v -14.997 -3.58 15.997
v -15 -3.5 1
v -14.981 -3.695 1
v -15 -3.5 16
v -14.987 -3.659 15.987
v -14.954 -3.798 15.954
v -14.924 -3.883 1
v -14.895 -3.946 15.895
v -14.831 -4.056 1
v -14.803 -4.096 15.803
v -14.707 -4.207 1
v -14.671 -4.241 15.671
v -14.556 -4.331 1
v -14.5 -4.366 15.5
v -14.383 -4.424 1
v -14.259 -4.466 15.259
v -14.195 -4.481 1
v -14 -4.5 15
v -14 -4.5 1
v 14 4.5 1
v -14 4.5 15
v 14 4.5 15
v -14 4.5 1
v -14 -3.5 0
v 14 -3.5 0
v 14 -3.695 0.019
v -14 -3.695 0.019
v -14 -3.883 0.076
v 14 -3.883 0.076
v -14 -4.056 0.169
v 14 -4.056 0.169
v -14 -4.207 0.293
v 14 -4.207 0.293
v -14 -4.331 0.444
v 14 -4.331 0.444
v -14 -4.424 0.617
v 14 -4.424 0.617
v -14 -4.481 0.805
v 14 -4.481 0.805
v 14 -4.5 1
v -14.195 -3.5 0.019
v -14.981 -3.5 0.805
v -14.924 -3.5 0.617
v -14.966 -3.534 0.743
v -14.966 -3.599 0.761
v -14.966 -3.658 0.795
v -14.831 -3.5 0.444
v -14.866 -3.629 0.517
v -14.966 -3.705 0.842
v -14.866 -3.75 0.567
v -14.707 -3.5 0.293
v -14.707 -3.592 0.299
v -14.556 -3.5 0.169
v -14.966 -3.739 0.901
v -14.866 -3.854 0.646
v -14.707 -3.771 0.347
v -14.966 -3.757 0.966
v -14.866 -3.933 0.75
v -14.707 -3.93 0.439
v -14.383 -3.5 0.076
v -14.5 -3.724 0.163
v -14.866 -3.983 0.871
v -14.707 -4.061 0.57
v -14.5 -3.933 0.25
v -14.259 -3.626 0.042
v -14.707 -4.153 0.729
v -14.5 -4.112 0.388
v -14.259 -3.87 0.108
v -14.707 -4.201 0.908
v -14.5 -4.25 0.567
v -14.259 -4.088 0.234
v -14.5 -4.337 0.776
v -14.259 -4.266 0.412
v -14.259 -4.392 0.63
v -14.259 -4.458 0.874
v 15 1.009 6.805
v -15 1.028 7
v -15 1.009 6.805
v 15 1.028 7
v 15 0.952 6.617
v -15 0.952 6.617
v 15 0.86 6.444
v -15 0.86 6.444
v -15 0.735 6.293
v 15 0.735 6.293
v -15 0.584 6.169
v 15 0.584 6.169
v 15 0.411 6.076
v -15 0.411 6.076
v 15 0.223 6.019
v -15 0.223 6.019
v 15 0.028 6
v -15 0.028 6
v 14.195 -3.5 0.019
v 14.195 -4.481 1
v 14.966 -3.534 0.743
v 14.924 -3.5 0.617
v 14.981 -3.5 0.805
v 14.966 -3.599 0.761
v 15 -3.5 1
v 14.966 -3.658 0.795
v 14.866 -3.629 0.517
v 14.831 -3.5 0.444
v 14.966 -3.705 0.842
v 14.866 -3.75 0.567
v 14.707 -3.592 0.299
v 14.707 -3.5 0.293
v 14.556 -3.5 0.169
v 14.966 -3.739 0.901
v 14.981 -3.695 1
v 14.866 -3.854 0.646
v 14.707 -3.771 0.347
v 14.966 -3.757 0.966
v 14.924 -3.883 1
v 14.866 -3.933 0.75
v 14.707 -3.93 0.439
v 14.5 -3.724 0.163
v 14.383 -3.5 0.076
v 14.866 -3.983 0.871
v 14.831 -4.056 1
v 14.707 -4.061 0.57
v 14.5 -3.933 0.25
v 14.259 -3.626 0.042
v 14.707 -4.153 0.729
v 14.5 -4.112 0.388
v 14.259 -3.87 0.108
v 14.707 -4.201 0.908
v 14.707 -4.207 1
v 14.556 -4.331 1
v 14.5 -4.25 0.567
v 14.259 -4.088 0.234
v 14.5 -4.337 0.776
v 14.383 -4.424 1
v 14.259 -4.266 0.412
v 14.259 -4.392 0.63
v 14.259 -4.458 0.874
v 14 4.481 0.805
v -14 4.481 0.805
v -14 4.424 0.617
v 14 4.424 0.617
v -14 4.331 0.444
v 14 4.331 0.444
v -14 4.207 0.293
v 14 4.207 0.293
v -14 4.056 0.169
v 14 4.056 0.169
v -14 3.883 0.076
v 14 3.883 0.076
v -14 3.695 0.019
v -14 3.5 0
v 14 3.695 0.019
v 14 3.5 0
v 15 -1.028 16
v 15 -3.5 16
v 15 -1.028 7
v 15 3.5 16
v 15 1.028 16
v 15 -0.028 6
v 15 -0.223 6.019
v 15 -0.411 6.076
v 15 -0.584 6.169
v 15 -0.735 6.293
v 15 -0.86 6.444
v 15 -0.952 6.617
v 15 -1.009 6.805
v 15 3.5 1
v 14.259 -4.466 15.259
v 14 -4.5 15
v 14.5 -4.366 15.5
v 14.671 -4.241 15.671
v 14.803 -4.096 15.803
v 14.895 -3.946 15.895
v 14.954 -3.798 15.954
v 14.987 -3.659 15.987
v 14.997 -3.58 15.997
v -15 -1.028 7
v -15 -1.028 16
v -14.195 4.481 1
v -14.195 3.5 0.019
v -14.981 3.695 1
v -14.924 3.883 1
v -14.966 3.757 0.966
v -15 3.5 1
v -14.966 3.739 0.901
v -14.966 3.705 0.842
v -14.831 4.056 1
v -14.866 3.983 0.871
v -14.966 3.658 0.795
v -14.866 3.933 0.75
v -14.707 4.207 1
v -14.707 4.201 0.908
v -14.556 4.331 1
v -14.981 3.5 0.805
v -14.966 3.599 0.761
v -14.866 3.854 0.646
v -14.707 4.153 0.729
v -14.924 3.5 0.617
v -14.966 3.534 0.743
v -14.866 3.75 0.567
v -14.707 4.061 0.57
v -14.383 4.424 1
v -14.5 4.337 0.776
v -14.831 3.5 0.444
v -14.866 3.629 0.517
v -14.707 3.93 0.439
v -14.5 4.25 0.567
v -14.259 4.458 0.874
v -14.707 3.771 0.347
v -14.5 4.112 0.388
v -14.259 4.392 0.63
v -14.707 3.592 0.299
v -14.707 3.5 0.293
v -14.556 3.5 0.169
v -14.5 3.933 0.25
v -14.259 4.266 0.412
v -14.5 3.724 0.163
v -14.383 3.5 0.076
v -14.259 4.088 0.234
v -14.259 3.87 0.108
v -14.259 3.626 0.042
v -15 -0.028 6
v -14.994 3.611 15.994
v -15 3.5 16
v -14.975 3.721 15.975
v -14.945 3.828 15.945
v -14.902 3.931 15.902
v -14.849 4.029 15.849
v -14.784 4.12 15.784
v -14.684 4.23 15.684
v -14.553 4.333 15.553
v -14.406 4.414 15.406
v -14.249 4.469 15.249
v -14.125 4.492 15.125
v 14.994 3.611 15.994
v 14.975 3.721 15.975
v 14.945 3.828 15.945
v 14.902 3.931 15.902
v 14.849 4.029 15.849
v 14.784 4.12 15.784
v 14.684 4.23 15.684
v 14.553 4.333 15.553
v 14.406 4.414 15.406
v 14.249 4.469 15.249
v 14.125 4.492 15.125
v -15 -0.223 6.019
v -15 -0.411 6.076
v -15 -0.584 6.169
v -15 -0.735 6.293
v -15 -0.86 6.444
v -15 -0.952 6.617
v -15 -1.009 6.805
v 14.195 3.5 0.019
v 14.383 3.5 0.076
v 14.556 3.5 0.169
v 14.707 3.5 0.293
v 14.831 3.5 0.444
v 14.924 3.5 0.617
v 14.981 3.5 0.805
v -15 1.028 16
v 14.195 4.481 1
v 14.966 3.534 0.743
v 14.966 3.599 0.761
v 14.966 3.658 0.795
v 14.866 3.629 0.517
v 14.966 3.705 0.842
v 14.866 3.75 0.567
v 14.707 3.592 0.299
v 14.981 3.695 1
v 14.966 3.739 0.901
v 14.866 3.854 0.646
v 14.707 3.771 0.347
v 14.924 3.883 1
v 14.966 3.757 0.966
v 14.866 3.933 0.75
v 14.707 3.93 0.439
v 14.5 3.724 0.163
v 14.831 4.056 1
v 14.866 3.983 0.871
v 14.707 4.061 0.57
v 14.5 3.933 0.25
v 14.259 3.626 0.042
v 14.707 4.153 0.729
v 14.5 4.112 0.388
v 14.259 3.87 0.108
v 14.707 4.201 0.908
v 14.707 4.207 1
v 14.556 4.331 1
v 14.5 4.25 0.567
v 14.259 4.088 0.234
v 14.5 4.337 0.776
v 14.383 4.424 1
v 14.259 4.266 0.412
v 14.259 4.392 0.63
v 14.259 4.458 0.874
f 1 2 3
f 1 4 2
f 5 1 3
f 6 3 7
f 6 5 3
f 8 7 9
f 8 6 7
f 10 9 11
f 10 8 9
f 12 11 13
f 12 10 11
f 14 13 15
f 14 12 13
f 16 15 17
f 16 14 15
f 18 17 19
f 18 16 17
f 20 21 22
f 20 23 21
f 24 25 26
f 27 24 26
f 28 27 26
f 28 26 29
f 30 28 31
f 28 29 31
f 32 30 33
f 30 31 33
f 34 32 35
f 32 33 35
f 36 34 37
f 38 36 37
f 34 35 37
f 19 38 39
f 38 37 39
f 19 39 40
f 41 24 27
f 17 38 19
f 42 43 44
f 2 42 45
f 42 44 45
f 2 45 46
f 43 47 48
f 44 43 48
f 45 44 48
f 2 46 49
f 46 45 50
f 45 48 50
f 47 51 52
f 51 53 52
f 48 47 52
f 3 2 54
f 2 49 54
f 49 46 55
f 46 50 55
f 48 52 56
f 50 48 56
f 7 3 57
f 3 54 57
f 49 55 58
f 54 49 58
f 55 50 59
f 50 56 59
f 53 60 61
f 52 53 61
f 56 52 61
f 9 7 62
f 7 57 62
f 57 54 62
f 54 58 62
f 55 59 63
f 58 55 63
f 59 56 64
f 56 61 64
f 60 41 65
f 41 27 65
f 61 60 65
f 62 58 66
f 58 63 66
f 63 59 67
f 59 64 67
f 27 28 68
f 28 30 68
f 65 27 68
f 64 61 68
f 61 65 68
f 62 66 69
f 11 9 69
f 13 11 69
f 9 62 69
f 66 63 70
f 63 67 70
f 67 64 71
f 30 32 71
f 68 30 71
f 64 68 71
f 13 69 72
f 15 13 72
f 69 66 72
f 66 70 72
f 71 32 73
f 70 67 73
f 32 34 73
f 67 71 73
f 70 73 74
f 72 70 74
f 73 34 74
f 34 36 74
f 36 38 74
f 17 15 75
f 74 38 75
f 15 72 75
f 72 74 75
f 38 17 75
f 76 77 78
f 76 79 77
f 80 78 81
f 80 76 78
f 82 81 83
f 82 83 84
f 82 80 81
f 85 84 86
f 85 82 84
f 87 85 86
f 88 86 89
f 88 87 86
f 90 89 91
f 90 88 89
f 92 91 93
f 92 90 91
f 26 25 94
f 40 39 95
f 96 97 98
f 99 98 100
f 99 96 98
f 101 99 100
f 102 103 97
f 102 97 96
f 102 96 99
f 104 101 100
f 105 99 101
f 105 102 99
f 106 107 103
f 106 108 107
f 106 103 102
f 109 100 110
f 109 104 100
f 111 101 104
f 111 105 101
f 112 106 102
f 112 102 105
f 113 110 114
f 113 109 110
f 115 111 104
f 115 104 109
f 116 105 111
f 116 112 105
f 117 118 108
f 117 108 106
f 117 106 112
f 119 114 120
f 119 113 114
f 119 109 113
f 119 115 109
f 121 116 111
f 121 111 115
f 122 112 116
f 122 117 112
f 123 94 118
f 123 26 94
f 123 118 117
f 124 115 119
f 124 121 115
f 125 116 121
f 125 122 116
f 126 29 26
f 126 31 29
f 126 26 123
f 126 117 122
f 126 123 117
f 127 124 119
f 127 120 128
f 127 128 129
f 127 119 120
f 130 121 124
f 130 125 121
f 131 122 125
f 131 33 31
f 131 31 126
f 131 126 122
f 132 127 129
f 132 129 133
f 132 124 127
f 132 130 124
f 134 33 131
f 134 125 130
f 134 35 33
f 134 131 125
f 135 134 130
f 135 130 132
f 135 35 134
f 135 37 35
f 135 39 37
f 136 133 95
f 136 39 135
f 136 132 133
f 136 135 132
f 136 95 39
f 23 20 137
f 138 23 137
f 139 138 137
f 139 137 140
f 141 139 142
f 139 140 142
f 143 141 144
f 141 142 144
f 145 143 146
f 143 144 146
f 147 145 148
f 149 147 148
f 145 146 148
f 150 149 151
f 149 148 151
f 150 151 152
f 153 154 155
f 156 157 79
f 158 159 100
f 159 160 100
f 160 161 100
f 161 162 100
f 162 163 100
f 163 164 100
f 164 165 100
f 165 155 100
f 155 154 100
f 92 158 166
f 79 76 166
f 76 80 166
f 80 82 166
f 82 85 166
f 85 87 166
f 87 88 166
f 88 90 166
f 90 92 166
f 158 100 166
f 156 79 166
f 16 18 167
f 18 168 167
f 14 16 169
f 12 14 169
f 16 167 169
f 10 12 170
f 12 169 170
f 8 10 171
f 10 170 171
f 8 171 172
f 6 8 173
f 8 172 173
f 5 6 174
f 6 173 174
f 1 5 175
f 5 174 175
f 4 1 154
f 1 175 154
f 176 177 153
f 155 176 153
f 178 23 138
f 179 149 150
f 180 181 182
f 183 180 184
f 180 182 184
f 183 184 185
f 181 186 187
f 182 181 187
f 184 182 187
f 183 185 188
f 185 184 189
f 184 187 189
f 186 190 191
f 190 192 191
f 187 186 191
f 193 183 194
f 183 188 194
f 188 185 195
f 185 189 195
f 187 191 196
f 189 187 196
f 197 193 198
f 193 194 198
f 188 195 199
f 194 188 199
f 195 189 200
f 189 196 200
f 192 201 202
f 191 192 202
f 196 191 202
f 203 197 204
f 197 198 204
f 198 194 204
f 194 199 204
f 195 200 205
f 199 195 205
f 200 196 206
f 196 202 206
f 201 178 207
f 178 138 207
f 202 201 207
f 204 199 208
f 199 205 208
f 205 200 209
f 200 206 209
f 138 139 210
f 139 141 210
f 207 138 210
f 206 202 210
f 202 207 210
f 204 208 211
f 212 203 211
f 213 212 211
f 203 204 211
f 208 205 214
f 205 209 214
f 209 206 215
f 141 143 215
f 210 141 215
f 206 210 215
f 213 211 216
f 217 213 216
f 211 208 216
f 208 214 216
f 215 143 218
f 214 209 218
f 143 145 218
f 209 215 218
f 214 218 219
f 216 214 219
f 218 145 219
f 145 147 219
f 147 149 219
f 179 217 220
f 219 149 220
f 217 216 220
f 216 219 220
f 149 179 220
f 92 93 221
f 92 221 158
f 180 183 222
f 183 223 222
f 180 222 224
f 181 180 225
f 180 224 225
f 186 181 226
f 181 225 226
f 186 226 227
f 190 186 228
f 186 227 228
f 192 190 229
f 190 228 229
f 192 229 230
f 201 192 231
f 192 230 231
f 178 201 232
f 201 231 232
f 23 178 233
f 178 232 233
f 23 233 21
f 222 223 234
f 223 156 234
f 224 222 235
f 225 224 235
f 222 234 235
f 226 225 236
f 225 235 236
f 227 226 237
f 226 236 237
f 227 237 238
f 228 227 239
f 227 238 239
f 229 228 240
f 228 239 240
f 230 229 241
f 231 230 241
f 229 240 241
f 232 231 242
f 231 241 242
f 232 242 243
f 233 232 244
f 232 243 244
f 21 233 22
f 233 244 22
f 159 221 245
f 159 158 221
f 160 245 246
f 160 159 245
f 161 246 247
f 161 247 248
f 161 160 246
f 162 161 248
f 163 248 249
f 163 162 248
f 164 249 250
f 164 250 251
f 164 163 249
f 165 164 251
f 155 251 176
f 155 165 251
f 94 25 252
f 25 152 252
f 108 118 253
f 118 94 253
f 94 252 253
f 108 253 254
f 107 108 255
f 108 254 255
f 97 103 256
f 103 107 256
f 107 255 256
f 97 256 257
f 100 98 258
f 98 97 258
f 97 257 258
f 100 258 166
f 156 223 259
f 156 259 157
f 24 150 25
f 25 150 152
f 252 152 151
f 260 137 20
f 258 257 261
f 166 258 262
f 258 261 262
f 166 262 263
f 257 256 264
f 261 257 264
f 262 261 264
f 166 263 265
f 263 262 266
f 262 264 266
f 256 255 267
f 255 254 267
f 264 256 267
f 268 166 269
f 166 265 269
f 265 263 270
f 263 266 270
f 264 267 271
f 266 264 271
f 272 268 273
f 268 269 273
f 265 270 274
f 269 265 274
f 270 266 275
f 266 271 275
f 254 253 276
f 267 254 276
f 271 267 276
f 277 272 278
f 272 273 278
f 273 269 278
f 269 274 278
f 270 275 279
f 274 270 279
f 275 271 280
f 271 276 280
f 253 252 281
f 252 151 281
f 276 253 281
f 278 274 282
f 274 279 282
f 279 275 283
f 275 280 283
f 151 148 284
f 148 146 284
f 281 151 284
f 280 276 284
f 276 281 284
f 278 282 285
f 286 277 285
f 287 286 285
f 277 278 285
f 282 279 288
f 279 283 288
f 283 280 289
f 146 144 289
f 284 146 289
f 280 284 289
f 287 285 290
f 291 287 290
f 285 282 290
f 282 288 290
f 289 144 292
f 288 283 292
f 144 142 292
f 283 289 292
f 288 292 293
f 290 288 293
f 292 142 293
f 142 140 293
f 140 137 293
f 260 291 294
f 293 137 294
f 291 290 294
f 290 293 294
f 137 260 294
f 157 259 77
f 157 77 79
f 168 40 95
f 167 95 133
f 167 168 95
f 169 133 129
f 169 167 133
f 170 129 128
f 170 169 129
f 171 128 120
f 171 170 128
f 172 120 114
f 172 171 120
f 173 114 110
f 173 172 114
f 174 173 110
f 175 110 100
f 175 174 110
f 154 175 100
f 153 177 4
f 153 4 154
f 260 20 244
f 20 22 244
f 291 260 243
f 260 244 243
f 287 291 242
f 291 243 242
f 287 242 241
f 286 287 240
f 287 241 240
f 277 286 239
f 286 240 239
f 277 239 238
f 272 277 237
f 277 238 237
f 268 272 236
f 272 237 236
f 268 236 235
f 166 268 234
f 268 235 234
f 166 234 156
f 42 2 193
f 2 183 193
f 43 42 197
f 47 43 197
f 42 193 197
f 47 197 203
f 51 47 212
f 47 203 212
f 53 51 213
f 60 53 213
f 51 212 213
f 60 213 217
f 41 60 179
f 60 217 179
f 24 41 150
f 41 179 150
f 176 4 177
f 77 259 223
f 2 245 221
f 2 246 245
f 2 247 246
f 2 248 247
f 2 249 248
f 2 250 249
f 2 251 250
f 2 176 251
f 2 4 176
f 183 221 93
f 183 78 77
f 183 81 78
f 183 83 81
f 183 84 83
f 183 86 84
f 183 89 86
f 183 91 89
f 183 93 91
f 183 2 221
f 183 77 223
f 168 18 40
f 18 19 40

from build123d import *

# Parameters (mm, degrees)
F0_W     = 30
F0_H     = 9
F1_DEPTH = 16
F2_W     = 30
F2_H     = 2.056142
F3_DEPTH = 10
F4_R     = 1
F5_R     = 1


with BuildPart() as f1:
    # F0 (on Top) → F1 (new body)
    with BuildSketch(Plane.XY):
        Rectangle(F0_W, F0_H)
    extrude(amount=F1_DEPTH)

    # F2 (on face) → F3 (cut)
    with BuildSketch(Plane.XY.offset(16)):
        Rectangle(F2_W, F2_H)
    extrude(amount=-F3_DEPTH, mode=Mode.SUBTRACT)

    # F4
    f4_edges = [f1.edges().sort_by_distance(p)[0] for p in [
        (0, -1.028071, 6),
        (0, 1.028071, 6),
    ]]
    fillet(f4_edges, radius=F4_R)

    # F5
    f5_edges = [f1.edges().sort_by_distance(p)[0] for p in [
        (0, 4.5, 16),
        (0, -4.5, 16),
        (0, 4.5, 0),
        (0, -4.5, 0),
        (15, 0, 0),
        (15, -4.5, 8),
        (15, 4.5, 8),
        (-15, 4.5, 8),
        (-15, 0, 0),
        (-15, -4.5, 8),
    ]]
    fillet(f5_edges, radius=F5_R)


solid = f1.part
